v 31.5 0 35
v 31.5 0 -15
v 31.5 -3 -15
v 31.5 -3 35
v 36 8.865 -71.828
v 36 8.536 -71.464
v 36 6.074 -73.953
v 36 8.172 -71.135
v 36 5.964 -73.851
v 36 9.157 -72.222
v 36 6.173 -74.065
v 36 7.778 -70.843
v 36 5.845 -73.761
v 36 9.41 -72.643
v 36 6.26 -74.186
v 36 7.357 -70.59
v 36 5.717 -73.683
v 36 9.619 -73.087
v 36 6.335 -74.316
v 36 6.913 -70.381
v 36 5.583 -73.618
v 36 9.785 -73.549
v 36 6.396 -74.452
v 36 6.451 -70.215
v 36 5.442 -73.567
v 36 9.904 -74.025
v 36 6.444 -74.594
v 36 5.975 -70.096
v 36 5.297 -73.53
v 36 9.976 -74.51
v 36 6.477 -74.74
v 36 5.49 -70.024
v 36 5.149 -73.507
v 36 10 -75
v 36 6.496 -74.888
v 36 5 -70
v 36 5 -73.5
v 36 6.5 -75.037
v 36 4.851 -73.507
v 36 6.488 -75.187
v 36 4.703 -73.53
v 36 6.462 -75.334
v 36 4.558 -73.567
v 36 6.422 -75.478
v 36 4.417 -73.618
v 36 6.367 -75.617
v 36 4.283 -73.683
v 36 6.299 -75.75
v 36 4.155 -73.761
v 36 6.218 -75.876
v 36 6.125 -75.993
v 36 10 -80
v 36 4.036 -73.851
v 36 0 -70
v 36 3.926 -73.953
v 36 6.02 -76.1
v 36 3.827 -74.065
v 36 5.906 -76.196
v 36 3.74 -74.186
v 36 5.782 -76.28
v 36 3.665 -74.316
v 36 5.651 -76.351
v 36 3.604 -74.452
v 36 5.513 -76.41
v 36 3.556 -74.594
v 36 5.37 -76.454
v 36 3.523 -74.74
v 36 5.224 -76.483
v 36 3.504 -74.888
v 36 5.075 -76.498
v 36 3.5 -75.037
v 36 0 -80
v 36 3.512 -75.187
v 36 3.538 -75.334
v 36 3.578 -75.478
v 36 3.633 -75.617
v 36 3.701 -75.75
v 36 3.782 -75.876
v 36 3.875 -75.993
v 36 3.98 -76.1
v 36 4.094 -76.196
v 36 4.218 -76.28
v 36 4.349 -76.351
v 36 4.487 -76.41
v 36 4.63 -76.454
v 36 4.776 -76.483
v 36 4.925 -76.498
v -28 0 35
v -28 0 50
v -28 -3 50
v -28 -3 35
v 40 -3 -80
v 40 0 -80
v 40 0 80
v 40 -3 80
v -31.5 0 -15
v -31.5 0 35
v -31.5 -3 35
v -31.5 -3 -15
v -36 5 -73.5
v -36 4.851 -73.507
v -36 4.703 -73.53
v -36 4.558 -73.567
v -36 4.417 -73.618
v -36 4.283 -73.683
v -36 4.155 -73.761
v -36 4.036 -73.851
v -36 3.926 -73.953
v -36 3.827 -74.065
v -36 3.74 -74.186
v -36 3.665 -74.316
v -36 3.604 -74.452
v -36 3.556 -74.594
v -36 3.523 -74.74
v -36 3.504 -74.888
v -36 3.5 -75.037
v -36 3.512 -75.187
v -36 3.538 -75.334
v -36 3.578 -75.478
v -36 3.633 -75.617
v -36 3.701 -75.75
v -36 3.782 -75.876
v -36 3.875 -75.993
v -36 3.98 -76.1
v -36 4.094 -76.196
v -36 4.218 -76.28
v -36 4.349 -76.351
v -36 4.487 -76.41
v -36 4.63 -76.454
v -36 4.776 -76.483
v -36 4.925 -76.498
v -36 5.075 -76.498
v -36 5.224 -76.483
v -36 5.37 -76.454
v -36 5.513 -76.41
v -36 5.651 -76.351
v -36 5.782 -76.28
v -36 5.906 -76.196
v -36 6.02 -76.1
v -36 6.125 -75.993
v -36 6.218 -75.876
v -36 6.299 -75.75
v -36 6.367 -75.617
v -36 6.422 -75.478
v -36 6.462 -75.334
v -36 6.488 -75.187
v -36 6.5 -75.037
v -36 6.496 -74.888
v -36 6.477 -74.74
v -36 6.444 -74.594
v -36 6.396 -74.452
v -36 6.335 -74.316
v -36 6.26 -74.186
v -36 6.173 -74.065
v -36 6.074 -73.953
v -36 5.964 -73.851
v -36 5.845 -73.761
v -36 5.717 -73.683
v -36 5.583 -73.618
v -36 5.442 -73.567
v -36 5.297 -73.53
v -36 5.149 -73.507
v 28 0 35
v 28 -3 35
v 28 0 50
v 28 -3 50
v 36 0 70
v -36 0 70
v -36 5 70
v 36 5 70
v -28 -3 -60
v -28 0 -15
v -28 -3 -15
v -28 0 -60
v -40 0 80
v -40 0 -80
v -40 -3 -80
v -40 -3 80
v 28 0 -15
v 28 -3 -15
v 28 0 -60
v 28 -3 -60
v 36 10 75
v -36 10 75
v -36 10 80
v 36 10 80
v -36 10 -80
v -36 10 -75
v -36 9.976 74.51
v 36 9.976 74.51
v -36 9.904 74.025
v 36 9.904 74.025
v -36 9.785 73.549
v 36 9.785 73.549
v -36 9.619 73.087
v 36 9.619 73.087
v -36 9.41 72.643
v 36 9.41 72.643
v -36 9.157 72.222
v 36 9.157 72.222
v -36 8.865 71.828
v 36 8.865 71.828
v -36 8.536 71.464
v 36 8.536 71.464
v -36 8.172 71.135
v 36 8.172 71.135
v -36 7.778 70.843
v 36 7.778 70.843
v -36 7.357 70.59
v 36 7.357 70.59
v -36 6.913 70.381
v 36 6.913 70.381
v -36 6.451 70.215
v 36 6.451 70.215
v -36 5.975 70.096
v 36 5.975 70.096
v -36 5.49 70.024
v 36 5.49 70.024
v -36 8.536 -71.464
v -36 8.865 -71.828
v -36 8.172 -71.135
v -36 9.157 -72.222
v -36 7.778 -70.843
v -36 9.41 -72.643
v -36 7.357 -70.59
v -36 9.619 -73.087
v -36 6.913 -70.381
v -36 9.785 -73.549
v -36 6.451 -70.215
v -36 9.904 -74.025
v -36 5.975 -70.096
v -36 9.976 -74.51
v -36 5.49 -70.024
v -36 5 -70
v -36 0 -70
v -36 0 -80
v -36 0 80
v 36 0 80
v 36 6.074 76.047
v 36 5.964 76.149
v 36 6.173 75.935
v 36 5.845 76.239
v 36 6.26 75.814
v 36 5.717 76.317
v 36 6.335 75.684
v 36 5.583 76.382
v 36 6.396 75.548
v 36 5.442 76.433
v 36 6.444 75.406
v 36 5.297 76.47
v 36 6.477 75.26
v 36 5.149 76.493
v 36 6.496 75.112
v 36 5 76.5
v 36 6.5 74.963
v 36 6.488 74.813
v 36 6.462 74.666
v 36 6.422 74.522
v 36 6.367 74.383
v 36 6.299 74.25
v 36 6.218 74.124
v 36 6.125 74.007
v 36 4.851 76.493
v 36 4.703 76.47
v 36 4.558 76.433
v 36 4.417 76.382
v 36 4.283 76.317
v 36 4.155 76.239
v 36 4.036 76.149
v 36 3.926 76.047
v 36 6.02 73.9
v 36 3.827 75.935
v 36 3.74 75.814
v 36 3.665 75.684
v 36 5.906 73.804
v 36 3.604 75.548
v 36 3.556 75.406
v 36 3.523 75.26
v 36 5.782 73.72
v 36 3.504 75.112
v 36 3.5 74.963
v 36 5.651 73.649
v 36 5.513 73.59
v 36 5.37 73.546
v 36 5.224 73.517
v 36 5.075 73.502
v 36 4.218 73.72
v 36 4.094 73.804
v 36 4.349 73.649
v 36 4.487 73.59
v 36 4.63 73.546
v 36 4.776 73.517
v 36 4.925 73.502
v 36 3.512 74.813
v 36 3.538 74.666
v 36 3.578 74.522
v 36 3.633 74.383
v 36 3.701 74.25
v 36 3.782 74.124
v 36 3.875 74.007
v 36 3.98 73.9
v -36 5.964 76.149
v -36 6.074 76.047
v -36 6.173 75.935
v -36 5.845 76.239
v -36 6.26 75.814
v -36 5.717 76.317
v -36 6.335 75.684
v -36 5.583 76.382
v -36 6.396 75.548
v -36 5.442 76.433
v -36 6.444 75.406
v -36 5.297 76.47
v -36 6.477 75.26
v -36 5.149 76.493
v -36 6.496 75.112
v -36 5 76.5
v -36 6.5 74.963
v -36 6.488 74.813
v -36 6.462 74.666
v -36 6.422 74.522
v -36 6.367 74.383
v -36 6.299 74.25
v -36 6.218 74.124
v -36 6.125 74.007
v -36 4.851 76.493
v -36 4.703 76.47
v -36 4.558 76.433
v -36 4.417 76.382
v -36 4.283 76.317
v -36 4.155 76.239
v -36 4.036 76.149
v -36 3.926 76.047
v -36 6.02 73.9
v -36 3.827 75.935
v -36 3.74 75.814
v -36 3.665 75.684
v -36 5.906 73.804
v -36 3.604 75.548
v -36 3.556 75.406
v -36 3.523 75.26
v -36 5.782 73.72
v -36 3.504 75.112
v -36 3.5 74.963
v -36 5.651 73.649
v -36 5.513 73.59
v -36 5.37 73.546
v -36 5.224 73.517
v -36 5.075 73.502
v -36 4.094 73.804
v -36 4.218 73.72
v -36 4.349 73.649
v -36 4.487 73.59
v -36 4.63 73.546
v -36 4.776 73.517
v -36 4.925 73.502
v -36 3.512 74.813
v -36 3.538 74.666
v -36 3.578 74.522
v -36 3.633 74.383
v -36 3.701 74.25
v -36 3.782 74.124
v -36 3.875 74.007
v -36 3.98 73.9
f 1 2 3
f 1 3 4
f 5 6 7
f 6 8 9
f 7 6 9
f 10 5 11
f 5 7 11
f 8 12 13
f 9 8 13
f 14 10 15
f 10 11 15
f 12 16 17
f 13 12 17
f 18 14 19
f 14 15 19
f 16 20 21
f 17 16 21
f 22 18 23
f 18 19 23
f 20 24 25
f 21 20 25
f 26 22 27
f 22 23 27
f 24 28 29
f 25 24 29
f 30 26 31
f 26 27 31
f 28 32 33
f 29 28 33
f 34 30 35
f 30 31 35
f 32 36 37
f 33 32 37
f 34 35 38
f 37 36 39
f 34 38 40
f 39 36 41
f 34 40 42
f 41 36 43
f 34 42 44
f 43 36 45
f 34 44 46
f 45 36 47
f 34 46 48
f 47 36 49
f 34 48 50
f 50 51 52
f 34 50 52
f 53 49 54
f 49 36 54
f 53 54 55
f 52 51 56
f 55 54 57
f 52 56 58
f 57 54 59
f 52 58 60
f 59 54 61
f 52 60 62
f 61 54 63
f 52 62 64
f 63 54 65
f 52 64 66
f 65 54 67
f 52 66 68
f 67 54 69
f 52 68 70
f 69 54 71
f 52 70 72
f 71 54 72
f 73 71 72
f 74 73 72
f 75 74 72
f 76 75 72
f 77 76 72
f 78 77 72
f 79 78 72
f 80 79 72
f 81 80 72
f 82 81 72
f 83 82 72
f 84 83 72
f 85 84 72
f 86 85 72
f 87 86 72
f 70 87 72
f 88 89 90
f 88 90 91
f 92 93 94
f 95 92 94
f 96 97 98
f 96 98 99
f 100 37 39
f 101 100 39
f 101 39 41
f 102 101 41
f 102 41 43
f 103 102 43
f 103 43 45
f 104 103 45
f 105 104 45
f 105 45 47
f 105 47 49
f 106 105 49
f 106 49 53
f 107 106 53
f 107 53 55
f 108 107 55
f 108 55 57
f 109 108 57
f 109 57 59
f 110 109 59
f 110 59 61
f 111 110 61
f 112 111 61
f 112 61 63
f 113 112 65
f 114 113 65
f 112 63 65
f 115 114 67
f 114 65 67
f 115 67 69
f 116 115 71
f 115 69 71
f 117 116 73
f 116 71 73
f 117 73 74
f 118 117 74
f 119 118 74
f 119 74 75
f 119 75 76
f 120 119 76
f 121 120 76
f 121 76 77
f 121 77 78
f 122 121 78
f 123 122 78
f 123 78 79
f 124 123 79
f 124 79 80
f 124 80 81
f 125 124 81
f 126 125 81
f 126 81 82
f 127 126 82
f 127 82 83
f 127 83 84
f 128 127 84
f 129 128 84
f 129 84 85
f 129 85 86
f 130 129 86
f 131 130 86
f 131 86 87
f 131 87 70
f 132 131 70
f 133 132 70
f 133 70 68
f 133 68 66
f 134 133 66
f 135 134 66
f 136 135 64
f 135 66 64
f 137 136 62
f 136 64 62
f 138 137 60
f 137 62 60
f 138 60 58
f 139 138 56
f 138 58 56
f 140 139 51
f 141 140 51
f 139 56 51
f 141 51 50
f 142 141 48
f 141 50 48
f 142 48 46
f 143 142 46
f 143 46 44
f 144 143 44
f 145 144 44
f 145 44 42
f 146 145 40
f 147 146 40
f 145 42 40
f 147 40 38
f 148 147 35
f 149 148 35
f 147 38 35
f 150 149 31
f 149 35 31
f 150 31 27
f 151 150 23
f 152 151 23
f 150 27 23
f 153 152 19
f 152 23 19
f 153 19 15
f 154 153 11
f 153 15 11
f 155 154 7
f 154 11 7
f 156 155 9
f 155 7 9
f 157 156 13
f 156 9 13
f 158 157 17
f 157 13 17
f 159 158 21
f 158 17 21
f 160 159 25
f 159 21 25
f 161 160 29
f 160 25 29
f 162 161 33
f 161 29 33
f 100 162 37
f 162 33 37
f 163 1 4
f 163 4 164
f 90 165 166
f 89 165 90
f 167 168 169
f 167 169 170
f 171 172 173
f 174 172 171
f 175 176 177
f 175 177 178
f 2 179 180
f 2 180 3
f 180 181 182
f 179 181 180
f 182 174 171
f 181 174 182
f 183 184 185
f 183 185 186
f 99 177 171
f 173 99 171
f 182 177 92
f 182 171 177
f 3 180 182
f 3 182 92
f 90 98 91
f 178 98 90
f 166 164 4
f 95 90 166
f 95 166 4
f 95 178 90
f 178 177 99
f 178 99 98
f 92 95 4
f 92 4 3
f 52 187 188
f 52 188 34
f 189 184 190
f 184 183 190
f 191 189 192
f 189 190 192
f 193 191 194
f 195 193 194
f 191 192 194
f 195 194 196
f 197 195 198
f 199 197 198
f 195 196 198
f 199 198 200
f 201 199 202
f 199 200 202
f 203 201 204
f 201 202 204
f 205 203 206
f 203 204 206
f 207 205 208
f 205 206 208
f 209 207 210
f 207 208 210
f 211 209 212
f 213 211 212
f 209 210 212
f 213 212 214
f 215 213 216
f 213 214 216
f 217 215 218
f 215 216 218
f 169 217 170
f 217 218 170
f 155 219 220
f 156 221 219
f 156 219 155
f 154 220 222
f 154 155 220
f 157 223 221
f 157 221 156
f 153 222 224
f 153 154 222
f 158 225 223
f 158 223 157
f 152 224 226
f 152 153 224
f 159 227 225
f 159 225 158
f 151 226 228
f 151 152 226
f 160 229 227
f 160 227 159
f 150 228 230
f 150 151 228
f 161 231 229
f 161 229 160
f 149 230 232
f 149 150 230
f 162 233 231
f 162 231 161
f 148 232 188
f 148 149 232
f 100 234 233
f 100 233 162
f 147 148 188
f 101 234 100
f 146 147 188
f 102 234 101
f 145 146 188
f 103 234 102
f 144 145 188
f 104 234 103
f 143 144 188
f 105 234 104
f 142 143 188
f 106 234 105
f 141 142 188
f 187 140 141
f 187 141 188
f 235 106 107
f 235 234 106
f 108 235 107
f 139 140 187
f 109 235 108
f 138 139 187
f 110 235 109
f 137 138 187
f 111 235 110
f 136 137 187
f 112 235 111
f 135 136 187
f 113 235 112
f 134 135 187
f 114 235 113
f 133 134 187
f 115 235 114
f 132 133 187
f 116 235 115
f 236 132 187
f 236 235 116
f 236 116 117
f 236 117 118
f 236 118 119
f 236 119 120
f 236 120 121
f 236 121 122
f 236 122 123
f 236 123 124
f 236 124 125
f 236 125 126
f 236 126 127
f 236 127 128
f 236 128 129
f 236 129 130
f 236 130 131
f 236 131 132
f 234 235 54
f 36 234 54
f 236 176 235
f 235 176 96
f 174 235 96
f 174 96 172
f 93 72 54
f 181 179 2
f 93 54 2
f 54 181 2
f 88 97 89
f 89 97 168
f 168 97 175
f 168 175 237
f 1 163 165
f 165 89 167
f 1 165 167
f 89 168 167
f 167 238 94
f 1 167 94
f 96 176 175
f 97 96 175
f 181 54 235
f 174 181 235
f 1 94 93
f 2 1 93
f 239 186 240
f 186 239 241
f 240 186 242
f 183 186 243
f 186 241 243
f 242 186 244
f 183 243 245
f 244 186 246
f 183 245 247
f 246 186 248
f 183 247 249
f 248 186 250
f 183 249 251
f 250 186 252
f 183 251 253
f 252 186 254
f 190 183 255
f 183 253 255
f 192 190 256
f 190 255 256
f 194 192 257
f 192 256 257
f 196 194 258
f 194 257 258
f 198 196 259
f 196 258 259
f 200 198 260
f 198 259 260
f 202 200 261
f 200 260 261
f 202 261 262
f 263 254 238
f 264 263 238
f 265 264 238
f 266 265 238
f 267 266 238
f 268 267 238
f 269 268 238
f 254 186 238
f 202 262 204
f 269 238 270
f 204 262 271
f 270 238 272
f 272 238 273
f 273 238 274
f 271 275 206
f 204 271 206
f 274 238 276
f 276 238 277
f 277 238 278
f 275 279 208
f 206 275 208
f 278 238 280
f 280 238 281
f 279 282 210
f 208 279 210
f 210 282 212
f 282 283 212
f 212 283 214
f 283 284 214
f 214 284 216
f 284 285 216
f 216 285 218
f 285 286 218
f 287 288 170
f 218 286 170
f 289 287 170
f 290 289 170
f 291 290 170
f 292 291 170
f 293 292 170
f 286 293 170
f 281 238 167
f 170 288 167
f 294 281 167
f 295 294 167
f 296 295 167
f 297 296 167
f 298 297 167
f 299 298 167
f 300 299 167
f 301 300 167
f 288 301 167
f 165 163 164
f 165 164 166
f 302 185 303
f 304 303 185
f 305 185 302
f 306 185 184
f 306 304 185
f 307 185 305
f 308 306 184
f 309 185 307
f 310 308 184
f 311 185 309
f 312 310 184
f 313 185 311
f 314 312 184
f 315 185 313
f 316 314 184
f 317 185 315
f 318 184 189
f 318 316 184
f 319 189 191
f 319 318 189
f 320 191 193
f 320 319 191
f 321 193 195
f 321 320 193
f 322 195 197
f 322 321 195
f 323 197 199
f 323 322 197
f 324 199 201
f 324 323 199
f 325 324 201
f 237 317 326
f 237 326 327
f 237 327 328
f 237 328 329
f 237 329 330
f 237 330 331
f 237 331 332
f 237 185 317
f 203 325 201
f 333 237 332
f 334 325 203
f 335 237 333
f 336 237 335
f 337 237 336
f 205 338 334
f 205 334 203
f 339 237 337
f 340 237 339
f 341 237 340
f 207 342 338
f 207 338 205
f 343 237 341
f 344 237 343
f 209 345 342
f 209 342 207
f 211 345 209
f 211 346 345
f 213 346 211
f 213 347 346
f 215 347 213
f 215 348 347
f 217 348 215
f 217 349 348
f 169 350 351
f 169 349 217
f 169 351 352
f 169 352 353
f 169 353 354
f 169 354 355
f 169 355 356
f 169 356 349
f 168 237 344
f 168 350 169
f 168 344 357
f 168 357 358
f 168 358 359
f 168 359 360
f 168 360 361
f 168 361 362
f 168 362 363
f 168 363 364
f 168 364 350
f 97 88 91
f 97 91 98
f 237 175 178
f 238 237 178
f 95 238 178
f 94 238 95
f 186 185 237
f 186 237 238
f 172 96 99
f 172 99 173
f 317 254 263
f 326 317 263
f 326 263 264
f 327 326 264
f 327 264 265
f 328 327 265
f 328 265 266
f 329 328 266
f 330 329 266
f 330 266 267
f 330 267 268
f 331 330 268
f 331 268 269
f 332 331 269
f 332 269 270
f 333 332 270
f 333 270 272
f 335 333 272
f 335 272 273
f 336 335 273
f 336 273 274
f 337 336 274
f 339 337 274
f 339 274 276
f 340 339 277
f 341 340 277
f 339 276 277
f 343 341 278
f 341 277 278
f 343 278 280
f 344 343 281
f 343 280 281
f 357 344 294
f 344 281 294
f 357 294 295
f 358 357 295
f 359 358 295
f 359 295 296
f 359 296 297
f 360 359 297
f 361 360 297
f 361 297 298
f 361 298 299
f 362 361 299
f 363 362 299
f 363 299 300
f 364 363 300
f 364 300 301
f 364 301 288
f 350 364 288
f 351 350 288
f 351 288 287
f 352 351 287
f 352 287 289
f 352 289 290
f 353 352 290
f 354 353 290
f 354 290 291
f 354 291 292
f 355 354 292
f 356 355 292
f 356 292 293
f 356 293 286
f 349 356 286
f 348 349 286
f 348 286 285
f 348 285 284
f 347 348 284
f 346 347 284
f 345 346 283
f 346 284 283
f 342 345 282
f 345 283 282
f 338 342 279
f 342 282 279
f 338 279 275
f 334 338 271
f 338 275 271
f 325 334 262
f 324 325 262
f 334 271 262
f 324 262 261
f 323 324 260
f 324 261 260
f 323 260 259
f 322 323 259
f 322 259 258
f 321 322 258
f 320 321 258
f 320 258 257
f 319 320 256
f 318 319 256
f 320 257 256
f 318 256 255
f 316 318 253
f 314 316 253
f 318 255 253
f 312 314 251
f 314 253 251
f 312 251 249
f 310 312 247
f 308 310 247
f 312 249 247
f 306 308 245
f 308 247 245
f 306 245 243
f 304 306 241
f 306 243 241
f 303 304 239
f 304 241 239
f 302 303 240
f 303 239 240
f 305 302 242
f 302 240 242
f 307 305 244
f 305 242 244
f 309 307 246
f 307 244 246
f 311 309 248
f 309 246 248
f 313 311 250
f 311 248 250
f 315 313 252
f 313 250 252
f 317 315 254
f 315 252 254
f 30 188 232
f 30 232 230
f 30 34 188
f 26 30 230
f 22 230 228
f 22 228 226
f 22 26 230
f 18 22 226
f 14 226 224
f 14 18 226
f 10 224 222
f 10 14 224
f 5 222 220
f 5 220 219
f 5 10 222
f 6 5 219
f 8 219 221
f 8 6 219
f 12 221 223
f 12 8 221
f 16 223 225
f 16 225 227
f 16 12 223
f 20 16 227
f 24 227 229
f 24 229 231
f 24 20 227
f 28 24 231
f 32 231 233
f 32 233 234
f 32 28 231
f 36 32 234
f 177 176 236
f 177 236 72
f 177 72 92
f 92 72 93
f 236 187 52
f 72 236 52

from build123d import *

# Parameters (mm, degrees)
SKETCH_W          = 80
SKETCH_H          = 160
PAD_DEPTH         = 3
SKETCH001_W       = 72
SKETCH001_H       = 10
PAD001_DEPTH      = 10
SKETCH002_R       = 1.5
POCKET_DEPTH      = 76.001
POCKET_DEPTH_BACK = 4.001
FILLET_R          = 5


with BuildPart() as part:
    # Sketch → Pad (new body)
    with BuildSketch(Plane.XZ):
        Rectangle(SKETCH_W, SKETCH_H)
        Polygon((-31.5, -15), (-28, -15), (-28, -60), (28, -60), (28, -15), (31.5, -15), (31.5, 35), (28, 35), (28, 50), (-28, 50), (-28, 35), (-31.5, 35), align=None, mode=Mode.SUBTRACT)
    extrude(amount=PAD_DEPTH)

    # Sketch001 (on Face17 of Pad) → Pad001 (join)
    with BuildSketch(Plane(origin=(0, 0, 0), x_dir=(1, 0, 0), z_dir=(0, 1, 0))):
        with Locations((0, 75)):
            Rectangle(SKETCH001_W, SKETCH001_H)
        with Locations((0, -75)):
            Rectangle(SKETCH001_W, SKETCH001_H)
    extrude(amount=PAD001_DEPTH)

    # Sketch002 (on Face8 of Pad001) → Pocket (cut, two sides)
    with BuildSketch(Plane(origin=(36, 0, 0), x_dir=(0, 0, 1), z_dir=(1, 0, 0))) as pocket_sk:
        with Locations((75, -5)):
            Circle(SKETCH002_R)
        with Locations((-75, -5)):
            Circle(SKETCH002_R)
    extrude(amount=-POCKET_DEPTH, mode=Mode.SUBTRACT)
    extrude(pocket_sk.sketch, amount=POCKET_DEPTH_BACK, mode=Mode.SUBTRACT)

    # Fillet
    fillet_edges = [part.edges().sort_by_distance(p)[0] for p in [
        (0, 10, -70),
        (0, 10, 70),
    ]]
    fillet(fillet_edges, radius=FILLET_R)


solid = part.part
